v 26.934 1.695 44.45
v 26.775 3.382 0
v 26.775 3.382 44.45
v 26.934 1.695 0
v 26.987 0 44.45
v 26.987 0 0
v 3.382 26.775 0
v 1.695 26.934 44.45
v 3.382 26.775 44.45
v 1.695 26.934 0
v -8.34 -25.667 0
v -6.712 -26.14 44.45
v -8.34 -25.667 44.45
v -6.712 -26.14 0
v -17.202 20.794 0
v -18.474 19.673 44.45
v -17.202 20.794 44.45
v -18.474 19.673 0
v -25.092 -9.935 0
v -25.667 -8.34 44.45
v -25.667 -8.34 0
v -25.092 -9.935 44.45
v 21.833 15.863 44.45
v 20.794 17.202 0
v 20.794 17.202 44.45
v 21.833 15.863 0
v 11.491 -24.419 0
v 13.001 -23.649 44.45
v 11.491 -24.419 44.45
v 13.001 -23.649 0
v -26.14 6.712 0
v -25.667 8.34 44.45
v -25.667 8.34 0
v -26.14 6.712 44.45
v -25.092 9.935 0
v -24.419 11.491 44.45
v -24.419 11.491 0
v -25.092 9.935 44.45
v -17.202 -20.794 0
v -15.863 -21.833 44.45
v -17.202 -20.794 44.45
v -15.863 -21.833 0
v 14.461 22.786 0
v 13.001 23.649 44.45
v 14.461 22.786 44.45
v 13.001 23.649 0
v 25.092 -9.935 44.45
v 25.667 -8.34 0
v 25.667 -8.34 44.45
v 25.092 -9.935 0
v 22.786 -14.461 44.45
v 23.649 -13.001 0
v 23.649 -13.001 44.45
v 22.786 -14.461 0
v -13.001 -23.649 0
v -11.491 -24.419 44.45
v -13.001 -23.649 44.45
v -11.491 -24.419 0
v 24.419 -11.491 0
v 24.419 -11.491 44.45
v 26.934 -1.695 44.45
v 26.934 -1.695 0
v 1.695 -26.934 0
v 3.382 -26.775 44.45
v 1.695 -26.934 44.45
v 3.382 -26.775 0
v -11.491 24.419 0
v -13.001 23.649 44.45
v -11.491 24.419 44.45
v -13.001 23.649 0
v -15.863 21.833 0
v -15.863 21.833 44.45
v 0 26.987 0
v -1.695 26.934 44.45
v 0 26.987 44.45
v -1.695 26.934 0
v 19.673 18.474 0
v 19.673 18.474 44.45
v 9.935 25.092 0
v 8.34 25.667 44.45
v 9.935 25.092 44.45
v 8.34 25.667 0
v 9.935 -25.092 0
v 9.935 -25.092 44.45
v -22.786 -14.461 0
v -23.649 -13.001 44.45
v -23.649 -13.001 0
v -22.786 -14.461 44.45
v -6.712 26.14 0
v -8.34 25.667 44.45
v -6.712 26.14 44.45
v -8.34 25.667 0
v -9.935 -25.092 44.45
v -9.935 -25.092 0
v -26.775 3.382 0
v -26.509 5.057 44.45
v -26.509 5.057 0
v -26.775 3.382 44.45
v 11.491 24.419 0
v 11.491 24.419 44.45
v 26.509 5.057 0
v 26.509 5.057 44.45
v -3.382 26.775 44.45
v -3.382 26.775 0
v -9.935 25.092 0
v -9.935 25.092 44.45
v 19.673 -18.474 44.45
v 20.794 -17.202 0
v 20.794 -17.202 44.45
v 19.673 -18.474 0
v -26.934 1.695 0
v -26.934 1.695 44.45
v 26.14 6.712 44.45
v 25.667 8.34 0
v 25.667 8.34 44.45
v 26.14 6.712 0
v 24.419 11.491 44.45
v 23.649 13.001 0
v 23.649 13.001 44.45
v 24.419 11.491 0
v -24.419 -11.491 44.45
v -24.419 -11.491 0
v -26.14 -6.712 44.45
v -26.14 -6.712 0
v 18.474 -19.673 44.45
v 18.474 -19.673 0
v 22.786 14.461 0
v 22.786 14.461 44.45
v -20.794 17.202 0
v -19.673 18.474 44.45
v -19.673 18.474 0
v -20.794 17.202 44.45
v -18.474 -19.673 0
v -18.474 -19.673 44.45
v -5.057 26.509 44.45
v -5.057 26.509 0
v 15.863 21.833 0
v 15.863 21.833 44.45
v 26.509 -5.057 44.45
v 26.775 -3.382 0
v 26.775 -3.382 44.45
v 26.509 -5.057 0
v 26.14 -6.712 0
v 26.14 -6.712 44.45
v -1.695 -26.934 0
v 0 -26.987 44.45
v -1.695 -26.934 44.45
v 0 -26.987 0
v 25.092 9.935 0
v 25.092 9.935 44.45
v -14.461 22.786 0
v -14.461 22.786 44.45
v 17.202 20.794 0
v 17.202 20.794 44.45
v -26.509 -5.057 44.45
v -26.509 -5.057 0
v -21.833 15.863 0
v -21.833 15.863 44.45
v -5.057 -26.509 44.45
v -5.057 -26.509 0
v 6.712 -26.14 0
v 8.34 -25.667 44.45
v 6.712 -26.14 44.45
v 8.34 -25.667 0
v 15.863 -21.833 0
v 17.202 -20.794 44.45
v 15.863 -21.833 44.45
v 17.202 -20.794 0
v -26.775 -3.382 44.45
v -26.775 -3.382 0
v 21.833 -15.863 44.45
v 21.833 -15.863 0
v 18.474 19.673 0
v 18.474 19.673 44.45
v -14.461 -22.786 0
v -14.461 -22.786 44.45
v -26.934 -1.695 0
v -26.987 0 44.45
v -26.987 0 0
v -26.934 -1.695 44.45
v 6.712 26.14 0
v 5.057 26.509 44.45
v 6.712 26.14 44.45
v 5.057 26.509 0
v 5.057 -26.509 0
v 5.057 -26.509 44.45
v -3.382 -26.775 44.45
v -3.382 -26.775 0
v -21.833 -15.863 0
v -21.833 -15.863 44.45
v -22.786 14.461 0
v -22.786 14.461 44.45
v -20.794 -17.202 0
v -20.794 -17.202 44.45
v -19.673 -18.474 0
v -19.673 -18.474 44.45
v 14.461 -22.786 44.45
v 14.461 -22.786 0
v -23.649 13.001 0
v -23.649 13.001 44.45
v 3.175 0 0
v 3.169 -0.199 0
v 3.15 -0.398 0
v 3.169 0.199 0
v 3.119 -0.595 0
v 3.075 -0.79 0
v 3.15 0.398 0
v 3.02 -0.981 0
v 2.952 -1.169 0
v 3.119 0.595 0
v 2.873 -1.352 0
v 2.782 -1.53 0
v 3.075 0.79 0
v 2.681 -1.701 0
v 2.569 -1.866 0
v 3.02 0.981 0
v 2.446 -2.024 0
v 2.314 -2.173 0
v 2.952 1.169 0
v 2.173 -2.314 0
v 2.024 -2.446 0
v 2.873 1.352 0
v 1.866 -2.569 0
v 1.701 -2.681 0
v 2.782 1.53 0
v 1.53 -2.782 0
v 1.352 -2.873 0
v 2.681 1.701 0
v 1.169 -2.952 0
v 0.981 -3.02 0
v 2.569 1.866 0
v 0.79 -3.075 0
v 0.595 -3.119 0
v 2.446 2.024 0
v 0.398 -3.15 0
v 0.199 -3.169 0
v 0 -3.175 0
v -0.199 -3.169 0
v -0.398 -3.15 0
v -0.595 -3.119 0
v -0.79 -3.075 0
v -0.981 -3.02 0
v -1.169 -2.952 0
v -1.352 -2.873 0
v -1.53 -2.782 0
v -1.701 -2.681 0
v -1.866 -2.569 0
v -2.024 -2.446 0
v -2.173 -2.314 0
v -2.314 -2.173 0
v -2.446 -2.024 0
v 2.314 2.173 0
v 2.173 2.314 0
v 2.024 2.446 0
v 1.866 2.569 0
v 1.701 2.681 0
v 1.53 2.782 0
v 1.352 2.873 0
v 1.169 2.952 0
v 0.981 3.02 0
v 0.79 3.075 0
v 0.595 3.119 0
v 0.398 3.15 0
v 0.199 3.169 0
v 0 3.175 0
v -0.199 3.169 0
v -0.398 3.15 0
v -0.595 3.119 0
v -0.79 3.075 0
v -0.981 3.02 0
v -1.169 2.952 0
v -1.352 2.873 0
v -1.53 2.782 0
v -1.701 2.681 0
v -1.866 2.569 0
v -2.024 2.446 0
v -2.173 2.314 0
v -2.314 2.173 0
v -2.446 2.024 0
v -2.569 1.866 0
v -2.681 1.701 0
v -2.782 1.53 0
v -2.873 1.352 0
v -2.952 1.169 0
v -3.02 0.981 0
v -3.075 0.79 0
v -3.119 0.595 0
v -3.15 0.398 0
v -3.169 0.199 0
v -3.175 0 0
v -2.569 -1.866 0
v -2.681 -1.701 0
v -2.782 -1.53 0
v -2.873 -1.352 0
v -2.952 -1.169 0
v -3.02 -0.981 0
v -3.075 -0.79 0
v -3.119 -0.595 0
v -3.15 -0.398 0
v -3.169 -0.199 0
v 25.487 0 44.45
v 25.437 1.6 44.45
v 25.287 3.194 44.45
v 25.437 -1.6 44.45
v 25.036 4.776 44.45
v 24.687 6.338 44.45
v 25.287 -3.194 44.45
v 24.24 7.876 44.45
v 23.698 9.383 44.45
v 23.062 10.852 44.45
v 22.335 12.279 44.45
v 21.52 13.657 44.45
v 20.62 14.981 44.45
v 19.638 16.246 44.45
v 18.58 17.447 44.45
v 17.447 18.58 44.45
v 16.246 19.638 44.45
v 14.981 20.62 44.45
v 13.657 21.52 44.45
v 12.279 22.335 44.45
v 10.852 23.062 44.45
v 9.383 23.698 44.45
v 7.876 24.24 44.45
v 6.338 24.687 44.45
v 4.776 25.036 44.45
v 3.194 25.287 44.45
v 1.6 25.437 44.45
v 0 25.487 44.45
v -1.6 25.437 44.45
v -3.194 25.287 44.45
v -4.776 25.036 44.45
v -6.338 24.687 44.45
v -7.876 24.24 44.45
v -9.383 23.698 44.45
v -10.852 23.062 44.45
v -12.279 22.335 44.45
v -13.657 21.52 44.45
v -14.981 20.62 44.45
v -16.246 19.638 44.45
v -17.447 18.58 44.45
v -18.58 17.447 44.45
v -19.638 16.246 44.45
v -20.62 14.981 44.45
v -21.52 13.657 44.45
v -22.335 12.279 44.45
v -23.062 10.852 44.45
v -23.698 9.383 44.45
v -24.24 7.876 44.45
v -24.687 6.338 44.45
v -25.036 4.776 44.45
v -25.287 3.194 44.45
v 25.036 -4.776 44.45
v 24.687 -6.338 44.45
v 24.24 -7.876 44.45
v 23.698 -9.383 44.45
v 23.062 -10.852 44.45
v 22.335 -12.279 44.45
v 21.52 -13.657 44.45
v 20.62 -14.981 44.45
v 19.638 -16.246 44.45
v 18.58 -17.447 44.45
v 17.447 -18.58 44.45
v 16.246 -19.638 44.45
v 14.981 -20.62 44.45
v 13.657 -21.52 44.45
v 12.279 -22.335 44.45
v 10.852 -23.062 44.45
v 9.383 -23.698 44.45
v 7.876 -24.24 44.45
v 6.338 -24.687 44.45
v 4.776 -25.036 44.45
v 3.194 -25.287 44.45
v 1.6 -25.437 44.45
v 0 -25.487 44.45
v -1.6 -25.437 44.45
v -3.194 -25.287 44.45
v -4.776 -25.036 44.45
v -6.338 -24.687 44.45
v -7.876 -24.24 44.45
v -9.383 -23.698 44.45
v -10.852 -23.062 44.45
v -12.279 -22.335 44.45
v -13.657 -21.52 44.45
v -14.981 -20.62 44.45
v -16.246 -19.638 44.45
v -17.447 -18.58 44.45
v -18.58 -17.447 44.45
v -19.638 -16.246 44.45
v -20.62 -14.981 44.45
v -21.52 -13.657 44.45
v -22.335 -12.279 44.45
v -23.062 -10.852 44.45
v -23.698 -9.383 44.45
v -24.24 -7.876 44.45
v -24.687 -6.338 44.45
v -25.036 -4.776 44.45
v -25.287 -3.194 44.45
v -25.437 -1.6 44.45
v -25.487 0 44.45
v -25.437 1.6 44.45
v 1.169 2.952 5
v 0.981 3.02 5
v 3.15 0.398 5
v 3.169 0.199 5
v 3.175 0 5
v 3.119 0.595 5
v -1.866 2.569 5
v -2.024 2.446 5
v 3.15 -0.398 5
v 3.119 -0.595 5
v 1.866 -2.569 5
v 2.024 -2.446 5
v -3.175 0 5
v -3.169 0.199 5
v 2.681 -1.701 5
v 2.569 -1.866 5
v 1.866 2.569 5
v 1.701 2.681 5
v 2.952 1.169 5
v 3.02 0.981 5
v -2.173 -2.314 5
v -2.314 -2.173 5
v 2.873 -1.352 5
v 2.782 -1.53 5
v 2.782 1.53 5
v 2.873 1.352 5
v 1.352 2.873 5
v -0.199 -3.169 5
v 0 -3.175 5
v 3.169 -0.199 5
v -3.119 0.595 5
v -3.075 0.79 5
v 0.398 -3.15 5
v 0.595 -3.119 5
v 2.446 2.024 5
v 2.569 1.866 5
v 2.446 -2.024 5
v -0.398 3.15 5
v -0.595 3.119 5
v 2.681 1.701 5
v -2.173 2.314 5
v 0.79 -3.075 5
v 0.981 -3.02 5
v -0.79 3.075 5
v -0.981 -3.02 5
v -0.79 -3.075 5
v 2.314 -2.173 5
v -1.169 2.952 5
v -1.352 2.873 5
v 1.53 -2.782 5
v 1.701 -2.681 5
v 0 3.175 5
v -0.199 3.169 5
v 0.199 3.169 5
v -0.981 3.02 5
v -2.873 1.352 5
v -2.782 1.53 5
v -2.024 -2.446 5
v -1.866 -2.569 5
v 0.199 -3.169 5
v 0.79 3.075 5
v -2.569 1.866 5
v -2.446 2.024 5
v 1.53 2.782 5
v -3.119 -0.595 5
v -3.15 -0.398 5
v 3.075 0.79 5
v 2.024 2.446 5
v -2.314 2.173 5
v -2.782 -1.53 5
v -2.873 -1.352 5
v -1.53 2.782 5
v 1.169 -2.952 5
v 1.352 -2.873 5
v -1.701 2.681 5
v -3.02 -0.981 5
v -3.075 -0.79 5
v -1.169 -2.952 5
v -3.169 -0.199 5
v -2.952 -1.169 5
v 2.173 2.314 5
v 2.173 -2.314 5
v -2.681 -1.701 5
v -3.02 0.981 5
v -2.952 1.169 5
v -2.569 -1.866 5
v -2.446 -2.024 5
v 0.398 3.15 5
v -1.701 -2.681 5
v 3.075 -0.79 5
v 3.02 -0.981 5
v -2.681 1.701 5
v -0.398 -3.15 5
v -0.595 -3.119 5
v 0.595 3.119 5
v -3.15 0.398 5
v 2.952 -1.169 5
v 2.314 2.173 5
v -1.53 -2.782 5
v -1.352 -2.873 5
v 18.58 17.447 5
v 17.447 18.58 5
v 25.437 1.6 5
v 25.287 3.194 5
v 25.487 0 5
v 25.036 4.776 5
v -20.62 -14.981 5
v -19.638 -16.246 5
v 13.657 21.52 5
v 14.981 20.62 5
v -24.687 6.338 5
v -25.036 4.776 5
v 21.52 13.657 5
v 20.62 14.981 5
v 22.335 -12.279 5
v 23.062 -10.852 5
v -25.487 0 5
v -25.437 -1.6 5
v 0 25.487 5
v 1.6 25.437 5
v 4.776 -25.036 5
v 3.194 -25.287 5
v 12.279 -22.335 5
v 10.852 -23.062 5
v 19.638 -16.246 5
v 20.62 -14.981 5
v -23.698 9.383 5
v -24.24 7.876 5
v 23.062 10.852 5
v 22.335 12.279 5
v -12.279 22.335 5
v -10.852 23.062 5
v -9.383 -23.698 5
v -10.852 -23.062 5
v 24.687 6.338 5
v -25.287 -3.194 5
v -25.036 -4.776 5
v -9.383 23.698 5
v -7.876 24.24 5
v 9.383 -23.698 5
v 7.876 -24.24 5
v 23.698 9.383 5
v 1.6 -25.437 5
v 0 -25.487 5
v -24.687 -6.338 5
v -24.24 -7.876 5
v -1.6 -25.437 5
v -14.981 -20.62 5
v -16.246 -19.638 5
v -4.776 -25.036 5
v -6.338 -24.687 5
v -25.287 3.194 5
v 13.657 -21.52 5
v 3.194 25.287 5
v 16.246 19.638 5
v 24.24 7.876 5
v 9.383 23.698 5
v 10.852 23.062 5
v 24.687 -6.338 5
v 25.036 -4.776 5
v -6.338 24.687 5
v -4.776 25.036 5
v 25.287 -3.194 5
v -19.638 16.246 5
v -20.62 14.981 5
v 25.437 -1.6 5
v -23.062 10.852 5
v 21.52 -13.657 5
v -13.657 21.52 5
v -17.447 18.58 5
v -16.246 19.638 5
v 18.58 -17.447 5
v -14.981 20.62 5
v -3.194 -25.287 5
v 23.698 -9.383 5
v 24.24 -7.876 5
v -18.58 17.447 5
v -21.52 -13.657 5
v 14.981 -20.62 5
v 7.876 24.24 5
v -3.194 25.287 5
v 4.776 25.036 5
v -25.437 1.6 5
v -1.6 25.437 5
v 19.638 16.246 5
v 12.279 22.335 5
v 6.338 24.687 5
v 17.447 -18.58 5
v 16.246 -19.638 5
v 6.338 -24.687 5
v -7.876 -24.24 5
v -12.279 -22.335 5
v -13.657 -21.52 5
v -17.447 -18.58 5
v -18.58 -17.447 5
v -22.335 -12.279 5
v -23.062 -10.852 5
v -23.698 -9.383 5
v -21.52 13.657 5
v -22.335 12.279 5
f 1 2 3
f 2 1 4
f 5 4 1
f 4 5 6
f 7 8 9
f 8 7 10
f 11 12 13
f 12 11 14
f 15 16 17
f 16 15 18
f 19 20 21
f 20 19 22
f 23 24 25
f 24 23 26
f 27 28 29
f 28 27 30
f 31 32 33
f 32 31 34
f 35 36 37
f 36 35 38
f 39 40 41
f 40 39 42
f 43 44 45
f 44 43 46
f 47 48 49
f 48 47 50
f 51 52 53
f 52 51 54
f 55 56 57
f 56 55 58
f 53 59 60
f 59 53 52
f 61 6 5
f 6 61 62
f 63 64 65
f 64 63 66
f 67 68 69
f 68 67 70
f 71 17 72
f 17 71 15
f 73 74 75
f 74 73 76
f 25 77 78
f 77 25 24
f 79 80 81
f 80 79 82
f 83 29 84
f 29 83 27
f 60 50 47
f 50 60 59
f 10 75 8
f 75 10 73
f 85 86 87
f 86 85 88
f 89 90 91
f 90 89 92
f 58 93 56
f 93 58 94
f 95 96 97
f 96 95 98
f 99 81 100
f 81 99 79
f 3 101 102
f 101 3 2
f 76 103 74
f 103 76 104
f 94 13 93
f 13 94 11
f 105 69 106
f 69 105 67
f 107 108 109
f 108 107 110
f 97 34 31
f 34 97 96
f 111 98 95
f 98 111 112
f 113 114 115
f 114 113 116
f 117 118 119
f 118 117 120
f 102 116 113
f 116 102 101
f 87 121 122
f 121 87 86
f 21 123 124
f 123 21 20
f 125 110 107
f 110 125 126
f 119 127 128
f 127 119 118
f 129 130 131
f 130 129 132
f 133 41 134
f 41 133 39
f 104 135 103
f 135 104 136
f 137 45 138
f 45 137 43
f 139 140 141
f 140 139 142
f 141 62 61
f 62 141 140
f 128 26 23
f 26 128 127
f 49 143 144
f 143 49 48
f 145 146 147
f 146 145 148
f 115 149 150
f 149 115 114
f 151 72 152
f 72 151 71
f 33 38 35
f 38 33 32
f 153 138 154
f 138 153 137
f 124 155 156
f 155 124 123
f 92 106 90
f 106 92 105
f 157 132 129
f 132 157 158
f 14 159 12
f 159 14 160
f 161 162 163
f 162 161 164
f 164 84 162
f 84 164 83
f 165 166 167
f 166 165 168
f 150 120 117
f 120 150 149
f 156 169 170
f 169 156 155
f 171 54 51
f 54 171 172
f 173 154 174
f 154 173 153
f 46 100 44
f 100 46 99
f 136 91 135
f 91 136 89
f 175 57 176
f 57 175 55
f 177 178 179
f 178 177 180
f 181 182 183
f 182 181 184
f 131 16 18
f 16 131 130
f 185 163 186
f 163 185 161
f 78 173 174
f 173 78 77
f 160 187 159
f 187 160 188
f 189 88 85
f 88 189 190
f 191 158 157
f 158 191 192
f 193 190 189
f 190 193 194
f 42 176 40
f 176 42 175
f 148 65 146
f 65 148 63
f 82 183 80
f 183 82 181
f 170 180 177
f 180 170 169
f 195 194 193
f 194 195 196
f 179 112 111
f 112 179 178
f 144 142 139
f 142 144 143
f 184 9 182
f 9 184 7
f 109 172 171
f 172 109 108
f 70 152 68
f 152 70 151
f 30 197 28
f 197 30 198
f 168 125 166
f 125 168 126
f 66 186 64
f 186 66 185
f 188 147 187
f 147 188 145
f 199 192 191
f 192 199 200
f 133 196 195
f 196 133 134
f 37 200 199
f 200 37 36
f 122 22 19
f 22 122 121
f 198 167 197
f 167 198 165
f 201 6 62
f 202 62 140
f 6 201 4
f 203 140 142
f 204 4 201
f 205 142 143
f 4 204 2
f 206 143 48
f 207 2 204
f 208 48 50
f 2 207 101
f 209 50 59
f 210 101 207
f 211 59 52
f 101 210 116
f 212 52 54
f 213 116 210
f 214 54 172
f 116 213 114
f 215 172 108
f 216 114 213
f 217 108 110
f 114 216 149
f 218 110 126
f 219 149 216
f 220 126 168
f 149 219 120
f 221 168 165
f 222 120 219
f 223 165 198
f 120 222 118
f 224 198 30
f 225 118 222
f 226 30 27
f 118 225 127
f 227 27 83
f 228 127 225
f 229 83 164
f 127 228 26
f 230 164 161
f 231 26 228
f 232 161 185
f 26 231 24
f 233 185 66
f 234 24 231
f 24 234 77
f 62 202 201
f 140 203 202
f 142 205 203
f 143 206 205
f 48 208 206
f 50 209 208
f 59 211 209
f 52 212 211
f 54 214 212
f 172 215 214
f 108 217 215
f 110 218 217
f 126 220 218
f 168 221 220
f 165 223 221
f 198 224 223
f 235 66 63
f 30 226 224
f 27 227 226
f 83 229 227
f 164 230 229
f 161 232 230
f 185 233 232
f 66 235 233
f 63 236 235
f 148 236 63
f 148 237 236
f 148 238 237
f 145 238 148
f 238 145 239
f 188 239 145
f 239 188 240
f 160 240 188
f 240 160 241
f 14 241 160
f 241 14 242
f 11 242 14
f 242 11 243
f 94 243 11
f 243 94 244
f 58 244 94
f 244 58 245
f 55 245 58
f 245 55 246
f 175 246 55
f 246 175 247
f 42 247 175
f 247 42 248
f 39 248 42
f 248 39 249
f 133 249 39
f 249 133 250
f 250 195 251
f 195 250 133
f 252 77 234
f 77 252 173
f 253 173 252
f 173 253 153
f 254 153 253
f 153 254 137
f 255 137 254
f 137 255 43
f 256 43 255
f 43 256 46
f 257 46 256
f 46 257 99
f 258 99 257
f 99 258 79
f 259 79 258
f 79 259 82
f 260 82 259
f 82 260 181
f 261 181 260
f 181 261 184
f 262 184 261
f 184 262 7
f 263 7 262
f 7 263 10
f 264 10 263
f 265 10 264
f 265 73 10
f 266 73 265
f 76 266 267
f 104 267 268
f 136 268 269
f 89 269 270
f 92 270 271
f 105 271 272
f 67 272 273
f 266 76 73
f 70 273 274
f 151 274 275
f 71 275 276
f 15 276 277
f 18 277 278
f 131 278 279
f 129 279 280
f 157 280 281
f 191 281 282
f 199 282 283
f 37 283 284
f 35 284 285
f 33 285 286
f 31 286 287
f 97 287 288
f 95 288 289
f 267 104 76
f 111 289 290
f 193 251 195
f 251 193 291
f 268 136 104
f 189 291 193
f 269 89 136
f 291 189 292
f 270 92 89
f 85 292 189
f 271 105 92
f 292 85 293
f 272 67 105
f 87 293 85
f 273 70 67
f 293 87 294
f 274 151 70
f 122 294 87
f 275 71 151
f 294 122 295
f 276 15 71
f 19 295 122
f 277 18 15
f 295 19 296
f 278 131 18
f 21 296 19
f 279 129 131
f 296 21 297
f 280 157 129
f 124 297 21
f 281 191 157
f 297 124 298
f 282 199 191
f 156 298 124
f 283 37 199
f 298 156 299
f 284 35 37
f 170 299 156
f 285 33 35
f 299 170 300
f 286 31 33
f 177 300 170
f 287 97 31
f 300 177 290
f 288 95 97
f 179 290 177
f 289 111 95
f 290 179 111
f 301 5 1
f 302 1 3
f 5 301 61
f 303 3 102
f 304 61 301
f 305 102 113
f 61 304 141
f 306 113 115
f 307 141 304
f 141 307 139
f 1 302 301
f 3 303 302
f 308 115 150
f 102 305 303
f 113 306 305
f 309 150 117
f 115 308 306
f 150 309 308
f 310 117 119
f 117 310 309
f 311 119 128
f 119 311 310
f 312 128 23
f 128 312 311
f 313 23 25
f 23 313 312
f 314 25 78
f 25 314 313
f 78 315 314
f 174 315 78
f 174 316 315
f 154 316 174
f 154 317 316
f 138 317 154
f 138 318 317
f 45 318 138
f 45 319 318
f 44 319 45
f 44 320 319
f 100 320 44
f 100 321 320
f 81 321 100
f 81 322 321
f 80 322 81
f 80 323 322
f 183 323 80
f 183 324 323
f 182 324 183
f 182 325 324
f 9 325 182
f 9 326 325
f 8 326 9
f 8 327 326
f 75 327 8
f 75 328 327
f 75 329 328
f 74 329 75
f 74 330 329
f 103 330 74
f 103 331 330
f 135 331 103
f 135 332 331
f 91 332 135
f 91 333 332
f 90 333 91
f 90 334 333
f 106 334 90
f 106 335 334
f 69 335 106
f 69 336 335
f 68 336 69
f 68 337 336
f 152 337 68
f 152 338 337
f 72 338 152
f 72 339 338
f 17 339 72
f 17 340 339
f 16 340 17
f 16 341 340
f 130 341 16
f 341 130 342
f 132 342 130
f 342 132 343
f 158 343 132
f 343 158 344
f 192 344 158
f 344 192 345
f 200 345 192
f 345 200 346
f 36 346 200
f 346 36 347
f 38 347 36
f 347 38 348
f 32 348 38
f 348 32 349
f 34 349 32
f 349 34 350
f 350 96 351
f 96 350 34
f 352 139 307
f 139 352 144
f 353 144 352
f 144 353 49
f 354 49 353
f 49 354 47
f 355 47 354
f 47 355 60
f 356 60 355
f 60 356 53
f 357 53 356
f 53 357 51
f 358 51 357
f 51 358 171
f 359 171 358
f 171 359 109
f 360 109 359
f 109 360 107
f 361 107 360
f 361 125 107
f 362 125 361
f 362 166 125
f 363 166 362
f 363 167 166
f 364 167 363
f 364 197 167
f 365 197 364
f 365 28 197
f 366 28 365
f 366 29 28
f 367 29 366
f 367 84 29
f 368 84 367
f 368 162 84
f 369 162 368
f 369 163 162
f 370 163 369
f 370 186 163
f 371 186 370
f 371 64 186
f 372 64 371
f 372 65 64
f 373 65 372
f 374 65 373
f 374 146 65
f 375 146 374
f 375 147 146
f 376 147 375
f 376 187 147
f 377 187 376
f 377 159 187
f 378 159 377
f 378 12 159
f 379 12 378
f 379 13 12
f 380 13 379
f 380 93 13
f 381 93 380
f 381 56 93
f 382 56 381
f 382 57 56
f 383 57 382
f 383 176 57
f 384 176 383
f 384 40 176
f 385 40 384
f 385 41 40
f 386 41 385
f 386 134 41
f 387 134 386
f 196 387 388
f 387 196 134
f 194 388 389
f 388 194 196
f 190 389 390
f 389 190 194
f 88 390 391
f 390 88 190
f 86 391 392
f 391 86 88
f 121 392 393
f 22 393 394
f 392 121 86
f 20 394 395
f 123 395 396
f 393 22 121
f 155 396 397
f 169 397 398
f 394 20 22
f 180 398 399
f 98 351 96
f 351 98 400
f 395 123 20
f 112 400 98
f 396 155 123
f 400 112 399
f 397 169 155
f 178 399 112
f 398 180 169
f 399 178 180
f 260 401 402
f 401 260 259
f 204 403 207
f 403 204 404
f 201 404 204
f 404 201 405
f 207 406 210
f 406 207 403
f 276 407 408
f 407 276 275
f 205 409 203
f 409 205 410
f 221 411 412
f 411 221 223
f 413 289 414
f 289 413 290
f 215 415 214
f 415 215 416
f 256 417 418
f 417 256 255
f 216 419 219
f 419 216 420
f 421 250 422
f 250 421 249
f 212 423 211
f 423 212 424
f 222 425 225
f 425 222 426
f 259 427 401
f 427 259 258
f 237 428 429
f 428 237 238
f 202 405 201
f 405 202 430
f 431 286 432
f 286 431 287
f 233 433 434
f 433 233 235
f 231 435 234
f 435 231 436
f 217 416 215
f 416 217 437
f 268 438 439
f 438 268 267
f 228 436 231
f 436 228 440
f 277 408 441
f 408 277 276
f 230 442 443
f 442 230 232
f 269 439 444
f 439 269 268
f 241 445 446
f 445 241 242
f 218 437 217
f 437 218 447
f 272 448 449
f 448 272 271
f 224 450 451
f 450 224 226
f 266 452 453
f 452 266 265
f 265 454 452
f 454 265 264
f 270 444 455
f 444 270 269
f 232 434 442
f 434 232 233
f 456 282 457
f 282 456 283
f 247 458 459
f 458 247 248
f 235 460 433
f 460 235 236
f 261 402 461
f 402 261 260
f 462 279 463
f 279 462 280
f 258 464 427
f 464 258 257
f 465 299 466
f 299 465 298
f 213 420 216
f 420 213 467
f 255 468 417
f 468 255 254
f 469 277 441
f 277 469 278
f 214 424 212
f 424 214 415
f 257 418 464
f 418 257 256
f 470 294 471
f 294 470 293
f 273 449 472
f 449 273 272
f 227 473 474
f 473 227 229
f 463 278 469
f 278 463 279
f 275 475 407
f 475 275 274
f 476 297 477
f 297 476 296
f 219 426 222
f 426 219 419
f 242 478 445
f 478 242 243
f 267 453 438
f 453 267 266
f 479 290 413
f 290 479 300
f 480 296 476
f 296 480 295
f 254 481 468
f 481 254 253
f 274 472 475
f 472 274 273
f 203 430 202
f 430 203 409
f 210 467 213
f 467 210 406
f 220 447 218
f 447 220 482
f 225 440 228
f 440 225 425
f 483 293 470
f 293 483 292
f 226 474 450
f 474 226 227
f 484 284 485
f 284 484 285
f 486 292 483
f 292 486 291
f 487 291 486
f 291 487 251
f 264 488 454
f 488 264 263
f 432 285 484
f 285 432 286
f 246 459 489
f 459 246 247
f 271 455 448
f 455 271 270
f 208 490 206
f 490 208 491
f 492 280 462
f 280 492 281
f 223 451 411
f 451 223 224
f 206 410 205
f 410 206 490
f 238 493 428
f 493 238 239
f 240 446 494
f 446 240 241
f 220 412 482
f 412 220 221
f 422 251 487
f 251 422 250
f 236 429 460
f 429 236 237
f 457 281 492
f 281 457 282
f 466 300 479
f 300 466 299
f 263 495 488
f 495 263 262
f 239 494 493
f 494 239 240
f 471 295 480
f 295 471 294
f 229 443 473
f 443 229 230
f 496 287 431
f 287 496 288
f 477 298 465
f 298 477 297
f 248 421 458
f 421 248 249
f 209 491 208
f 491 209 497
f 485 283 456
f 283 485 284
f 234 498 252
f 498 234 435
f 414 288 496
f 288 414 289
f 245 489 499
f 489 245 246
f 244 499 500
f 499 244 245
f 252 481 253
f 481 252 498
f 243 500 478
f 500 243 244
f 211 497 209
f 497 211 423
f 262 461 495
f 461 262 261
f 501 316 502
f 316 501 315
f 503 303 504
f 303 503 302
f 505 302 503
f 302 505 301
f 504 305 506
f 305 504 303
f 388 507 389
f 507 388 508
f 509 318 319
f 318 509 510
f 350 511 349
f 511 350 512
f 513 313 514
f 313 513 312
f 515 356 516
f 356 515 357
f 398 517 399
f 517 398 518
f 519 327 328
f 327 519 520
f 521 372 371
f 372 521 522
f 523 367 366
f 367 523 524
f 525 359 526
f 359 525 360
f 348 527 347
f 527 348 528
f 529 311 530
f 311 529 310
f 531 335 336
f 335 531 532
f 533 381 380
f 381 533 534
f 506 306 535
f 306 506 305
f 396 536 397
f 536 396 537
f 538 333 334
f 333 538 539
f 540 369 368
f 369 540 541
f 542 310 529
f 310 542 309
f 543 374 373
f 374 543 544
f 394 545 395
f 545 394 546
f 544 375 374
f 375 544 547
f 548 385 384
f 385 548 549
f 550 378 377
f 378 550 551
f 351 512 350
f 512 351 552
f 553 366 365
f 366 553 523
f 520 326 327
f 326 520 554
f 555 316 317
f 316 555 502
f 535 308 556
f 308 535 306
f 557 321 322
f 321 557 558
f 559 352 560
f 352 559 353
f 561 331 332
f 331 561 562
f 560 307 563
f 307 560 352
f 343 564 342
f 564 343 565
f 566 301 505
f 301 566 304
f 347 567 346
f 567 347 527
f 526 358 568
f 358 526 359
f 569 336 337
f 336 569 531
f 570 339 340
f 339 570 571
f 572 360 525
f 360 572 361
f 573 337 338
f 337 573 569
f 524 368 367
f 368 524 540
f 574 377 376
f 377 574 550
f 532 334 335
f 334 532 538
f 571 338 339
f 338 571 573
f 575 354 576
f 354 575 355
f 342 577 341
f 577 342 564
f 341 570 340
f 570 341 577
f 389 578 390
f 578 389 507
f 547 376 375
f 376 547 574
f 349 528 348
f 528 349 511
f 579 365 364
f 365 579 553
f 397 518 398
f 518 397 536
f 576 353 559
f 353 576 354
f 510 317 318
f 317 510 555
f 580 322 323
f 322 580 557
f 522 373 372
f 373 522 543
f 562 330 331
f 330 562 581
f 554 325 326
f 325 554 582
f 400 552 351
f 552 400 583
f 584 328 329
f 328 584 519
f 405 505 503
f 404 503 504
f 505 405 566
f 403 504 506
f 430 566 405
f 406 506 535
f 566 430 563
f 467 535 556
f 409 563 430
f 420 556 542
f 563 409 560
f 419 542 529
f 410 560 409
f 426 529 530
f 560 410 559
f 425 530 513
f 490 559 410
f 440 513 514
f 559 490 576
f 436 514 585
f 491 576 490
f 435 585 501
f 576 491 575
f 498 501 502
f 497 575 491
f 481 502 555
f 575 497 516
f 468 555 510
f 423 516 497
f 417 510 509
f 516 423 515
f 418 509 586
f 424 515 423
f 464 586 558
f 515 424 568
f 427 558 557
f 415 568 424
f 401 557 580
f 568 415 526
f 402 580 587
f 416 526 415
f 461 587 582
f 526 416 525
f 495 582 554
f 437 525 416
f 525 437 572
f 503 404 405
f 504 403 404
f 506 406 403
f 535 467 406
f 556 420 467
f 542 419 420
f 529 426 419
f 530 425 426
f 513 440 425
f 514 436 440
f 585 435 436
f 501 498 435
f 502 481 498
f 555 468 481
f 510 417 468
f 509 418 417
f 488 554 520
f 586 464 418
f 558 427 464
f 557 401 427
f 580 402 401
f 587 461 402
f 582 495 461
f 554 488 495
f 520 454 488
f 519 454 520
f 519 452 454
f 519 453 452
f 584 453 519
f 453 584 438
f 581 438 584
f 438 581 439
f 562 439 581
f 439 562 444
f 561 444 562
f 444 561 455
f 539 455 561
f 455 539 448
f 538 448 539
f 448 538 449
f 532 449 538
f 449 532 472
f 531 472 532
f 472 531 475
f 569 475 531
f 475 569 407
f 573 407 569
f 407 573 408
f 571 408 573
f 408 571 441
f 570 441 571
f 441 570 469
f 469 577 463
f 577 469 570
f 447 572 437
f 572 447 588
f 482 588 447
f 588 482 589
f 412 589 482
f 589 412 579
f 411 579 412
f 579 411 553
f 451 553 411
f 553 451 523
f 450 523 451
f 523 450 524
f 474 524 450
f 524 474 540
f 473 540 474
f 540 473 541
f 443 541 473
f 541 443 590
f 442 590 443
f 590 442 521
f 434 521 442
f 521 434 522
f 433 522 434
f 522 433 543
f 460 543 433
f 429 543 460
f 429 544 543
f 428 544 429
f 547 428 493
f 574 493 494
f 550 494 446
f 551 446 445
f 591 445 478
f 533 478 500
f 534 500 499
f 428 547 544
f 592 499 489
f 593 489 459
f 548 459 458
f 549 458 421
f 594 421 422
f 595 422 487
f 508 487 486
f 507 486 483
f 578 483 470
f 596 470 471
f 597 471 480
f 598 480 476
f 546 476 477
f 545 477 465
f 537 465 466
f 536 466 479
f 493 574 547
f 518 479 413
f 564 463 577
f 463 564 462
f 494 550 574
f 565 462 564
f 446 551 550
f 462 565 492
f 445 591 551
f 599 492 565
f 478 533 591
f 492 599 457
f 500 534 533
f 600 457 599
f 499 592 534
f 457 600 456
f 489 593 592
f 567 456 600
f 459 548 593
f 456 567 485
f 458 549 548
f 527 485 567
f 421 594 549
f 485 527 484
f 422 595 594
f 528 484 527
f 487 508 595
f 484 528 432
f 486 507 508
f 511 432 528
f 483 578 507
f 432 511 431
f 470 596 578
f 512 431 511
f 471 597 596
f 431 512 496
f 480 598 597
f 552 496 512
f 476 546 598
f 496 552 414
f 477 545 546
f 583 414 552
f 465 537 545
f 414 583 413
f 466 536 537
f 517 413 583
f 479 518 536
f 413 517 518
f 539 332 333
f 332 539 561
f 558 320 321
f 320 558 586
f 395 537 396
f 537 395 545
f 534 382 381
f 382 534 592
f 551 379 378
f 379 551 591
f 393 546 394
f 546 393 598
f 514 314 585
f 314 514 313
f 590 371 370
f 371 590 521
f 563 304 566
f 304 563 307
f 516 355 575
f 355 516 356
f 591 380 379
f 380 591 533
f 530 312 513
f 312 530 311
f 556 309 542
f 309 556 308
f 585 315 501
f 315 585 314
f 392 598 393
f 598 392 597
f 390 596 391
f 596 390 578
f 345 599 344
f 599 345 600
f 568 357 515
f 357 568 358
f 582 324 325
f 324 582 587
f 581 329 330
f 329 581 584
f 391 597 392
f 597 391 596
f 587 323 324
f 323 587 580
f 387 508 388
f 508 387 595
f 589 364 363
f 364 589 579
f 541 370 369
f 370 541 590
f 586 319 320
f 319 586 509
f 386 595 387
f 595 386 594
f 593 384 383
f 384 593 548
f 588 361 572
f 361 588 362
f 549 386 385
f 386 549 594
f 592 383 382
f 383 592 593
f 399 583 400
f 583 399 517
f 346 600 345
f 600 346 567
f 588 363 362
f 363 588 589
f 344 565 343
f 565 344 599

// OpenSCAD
// file: myTools.scad
module tube (r = 0, d = 0, l = 0, 
            thick = 0, 
            bCentered = true, 
            taper_pct = 0, 
            circlip = false) // r=radius d=dia l=length 
{
    assert( r != 0 || d != 0, "specify one of radius or diameter");
    assert( l != 0 , "tube: need length 'l' to be non zero");
    assert( thick != 0, "wall thickness cannot be zero");

    punch = $preview ? .2 : 0; // stop funny view artifact

    dia = r ? r * 2 : d;

    od = ((thick > 0) ? dia + thick * 2 : dia);
    id = (thick > 0) ? dia             : dia  + thick *2; 

    
    
    if (thick > 0)
        echo ("tube\tMIN id = ", id, "od = ", od, "wall = ", thick, "center= ", bCentered);
    else
        echo ("tube\tMAX od = ", od, "id = ", id, "wall = ", thick, "center= ", bCentered);

    echo ("tube\tHeigth = ", l);
        
    if (taper_pct != 0)
    {
        echo ("tube\t*** OD expanded by ", taper_pct, "%, : bottom od = ", od * (1. +taper_pct/100), "top od = ", od);
    }
    
    assert(dia || dia < 0, "tube : missing r or d ");
    
    // if taper_pct specified, the base will always be closest to 0,0,0
    translate([ 0, 0, taper_pct == 0 ? 0: bCentered ? l/2:l  ])
    rotate([0, taper_pct == 0 ? 0 : 180, 0 ])

    difference()
    {
        // make a reese's cup
        {
            color("YELLOW", .3)
            linear_extrude(height= l, scale = 1 + taper_pct/100)
                difference()
                {
                    circle(d = od);
                    circle(d = .5);
                }
        }
    
     // hollow out reessed cup
     color("GREEN")
     translate([0, 0, -punch/2])
     linear_extrude(height= l+ punch*2, $fn=100)
     {
        circle(d = id);
        if (circlip) #square([1 + punch, od ]);
     }
    
    }
}
//==============================================================================
        
module abox (dims, 
            thick = 0, 
            bCentered = true, 
            round_out = 0, 
            round_in = 0, 
            bSolid = false,
            bHollow = false,
            elevator = 0)   // move bottom up by X
{
    punch = $preview ? .1 : 0; // stop funny view artifact
    
    assert(thick != 0, "Thick must be specified. +=outside dim, -= inside dims");
    assert(dims.z > thick, "wall thickness too large for depth of box");

    wall2 = abs(thick) * 2; // 2 walls in each direction
    wall = wall2 / 2;
    
    // box either grows inward (thick < 0) or outward (thick > 0)  from dims
    fat = dims + [ wall2, wall2, wall];
    thin = dims - [ wall2, wall2, wall];
    
    offset = (thick > 0 && bCentered == false) ? wall : 0;
    
    //echo ("abox : adjusting x,y,z by ", offset, " to move origin from  center to 0,0,0");
    translate( [ bCentered ? 0 : dims.x /2 + offset, bCentered ? 0 : dims.y /2 + offset, bCentered ? 0 : dims.z /2 + offset/2]) 
    {
        if (thick > 0)
        {   
            // wall grows outwards from users dim
            echo ("making a box, MAX INSIDE dim = ", dims);
            echo ("   wall=", thick, " mm");
            echo ("   calc outside = ", fat, " mm");
        }
        else
        {
            // wall grows inward from users dime
            echo ("making a box, MAX OUTSIDE dim = ", dims);
            echo ("    wall=", thick, "mm");
            echo ("    calc inside = ", thin, " mm");
        }
        echo (" ");
        
        // linear extrude alway works in the positive x/y plane an goes upward.
        // after calc, re-center about 0,0,0 where a bCentered cube would be
        
        translate([ 0, 0, thick > 0  ? -fat.z/2 : -dims.z/2 ])
        difference()
        {
            echo ("round_out = ", round_out);

            // MAKE SOLID BOX --------------------------------------
            router_outside = round_out ? round_out : 0;
            x = thick > 0  ? fat.x - router_outside : dims.x - router_outside;
            y = thick > 0  ? fat.y - router_outside : dims.y - router_outside;


            // MAKE PUCHNED INSIDE
            // using 'offset' it will add r on all dimensions, then round., 
            // so now you have fatter perimeter than you started with :(
            //  but at least the corners are round.
            
            // Compensate by shrinking dimension by r, 
            // and then by calling offset, offset will then add it back

            //color("YELLOW", .2)

            // ready height 
            linear_extrude(thick > 0  ? fat.z : dims.z)
            if (round_out)
            {
                offset( r= round_out, $fn=30)
                square( [x - router_outside, y - router_outside], true);
            }
            else
            {
                // no rounding on outside dims.
                square( [x, y], true);
            }
            // time to punch out the inside if requested.
            if (bSolid == false)
            {
                hollow_offset = bHollow ? fat.z/2 + .2  : dims.z/2 +.2;
                // punching out inside. its either dims or thin.
                router_inside = round_in;
                echo ("round_in = ", router_inside);
                xi = thick > 0  ? dims.x  : thin.x;
                yi = thick > 0  ? dims.y : thin.y ;

                color("GREEN")

                // move 'punch' up if you need a bottom else zero (hollowed out)

                translate([ 0,0, bHollow ? -.1 : wall + elevator]) 
                linear_extrude(thick > 0  ? fat.z - wall  + hollow_offset : dims.z - wall + hollow_offset)
                //#linear_extrude(fat.z - wall  + hollow_offset)
                
                if (round_in) 
                {
                    offset( r= round_in, $fn=30)
                    square( [ xi - round_in*2, yi - round_in*2], true);
                }
                else
                    square( [ xi, yi], true);
            }
        }
    }
 }
//-----------------------------------------------------
module abox_punch (dims, 
            thick = 0, 
            bCentered = true, 
            round_out = 0, 
            round_in = 0, 
            bSolid = false,
            bHollow = false,
            elevator = 0)   // move bottom up by X
{
    // move bottom down by wall thickness to blow out bottom
    abox(dims, thick, bCentered,
         round_out, round_in, bSolid = false, 
         bHollow=true, elevator = -thick);
}



// 50x25x10 box walls grow inward (-2). on center origin midpoint
// rounded outside (default), sharp corner inside(default), bCentered about 0,0,0
//color("GREEN", .9)
//abox([50,25, 10], -2, true); 


// 50x25x10 box walls grow outward (+2). on center origin midpoint
// sharp outside corners, rounded inside corners. Sit on x,y plane
color("BLUE", .9)
abox([50,20, 10], +2, round_in=2, bCentered = false);  // 50x25x10 box inside dim origin has 0,0


// 50x25x10 box walls grow inward (-2). on center origin midpoint
// sharp corners inside and out. sits on x,y plane
color("GREY", .9)//
translate([ 55, 0, 0])      
abox([50,20, 10], +2, round_out=3, false);

color("PINK", .9)//
translate([ 55 * 2, 0, 0])      
abox_punch([50,20, 10], +2, round_out=3, false);

color("GREEN", .9)//
translate([ 55 * 3, 0, 0])      
abox_punch([50,20, 10], +2, round_in=2, false);


color("CYAN", .9)//
translate([ 55 * 4, 0, 0])      
abox_punch([50,20, 10], +2, round_in=2, round_out=2, false);


/*
color("GREEN", .9)//
translate([ 140, 10, -10])      
abox([86.66, 56.865, 5], 3, bHollow = true, bCentered = false); 
*/

/*
// 50x25x10 box walls grow inward (-2). on center origin midpoint
// round corners outside and SOLID
color("BLUE", .9)//
translate([ 55, 0, 0])      
abox([50,25, 10], +2, round_out=2, round_in=0, false, bSolid = true); // 50x25x10 box outside dim origin is 0,0
*/

//translate ([-30,-30, 0])
{
/*
    // tube outer dia  20, inner dia = (20 - 8)
    color("PINK")
    tube (d = 20, l = 20, thick = -8, bCentered = false);

    // tube, inner dia = (2* 10), outer dia = ((2*10) + 2) 
    color("PURPLE", .3)
    tube (r = 10, l = 20, thick = +2, bCentered= true);
*/
/*
    tube (d = 60, l = 20, thick = -6, bCentered = false);

    translate([0, 0, 50])
    tube (d = 60, l = 20, thick = -6, bCentered = false, taper_pct = 20, circlip = true);
    //color("GREEN")
    //tube (d = 20, l = 20, thick = -2, bCentered = false, taper = 10, circlip = true);
*/

}
// main file
use <myTools.scad>
$fn=100;

MM_PER_IN=25.4;

OUTER_DIA= (2 + 1/8) * MM_PER_IN;
THICK = (1 + 3/4) * MM_PER_IN;
HOLE= 1/4 * MM_PER_IN;

difference()
{
    cylinder(h=THICK,  d=OUTER_DIA);
    cylinder(h=THICK,  d=HOLE);
    
    translate([ 0,0, 5])
    cylinder(h=THICK,  d=OUTER_DIA - 3);
}
